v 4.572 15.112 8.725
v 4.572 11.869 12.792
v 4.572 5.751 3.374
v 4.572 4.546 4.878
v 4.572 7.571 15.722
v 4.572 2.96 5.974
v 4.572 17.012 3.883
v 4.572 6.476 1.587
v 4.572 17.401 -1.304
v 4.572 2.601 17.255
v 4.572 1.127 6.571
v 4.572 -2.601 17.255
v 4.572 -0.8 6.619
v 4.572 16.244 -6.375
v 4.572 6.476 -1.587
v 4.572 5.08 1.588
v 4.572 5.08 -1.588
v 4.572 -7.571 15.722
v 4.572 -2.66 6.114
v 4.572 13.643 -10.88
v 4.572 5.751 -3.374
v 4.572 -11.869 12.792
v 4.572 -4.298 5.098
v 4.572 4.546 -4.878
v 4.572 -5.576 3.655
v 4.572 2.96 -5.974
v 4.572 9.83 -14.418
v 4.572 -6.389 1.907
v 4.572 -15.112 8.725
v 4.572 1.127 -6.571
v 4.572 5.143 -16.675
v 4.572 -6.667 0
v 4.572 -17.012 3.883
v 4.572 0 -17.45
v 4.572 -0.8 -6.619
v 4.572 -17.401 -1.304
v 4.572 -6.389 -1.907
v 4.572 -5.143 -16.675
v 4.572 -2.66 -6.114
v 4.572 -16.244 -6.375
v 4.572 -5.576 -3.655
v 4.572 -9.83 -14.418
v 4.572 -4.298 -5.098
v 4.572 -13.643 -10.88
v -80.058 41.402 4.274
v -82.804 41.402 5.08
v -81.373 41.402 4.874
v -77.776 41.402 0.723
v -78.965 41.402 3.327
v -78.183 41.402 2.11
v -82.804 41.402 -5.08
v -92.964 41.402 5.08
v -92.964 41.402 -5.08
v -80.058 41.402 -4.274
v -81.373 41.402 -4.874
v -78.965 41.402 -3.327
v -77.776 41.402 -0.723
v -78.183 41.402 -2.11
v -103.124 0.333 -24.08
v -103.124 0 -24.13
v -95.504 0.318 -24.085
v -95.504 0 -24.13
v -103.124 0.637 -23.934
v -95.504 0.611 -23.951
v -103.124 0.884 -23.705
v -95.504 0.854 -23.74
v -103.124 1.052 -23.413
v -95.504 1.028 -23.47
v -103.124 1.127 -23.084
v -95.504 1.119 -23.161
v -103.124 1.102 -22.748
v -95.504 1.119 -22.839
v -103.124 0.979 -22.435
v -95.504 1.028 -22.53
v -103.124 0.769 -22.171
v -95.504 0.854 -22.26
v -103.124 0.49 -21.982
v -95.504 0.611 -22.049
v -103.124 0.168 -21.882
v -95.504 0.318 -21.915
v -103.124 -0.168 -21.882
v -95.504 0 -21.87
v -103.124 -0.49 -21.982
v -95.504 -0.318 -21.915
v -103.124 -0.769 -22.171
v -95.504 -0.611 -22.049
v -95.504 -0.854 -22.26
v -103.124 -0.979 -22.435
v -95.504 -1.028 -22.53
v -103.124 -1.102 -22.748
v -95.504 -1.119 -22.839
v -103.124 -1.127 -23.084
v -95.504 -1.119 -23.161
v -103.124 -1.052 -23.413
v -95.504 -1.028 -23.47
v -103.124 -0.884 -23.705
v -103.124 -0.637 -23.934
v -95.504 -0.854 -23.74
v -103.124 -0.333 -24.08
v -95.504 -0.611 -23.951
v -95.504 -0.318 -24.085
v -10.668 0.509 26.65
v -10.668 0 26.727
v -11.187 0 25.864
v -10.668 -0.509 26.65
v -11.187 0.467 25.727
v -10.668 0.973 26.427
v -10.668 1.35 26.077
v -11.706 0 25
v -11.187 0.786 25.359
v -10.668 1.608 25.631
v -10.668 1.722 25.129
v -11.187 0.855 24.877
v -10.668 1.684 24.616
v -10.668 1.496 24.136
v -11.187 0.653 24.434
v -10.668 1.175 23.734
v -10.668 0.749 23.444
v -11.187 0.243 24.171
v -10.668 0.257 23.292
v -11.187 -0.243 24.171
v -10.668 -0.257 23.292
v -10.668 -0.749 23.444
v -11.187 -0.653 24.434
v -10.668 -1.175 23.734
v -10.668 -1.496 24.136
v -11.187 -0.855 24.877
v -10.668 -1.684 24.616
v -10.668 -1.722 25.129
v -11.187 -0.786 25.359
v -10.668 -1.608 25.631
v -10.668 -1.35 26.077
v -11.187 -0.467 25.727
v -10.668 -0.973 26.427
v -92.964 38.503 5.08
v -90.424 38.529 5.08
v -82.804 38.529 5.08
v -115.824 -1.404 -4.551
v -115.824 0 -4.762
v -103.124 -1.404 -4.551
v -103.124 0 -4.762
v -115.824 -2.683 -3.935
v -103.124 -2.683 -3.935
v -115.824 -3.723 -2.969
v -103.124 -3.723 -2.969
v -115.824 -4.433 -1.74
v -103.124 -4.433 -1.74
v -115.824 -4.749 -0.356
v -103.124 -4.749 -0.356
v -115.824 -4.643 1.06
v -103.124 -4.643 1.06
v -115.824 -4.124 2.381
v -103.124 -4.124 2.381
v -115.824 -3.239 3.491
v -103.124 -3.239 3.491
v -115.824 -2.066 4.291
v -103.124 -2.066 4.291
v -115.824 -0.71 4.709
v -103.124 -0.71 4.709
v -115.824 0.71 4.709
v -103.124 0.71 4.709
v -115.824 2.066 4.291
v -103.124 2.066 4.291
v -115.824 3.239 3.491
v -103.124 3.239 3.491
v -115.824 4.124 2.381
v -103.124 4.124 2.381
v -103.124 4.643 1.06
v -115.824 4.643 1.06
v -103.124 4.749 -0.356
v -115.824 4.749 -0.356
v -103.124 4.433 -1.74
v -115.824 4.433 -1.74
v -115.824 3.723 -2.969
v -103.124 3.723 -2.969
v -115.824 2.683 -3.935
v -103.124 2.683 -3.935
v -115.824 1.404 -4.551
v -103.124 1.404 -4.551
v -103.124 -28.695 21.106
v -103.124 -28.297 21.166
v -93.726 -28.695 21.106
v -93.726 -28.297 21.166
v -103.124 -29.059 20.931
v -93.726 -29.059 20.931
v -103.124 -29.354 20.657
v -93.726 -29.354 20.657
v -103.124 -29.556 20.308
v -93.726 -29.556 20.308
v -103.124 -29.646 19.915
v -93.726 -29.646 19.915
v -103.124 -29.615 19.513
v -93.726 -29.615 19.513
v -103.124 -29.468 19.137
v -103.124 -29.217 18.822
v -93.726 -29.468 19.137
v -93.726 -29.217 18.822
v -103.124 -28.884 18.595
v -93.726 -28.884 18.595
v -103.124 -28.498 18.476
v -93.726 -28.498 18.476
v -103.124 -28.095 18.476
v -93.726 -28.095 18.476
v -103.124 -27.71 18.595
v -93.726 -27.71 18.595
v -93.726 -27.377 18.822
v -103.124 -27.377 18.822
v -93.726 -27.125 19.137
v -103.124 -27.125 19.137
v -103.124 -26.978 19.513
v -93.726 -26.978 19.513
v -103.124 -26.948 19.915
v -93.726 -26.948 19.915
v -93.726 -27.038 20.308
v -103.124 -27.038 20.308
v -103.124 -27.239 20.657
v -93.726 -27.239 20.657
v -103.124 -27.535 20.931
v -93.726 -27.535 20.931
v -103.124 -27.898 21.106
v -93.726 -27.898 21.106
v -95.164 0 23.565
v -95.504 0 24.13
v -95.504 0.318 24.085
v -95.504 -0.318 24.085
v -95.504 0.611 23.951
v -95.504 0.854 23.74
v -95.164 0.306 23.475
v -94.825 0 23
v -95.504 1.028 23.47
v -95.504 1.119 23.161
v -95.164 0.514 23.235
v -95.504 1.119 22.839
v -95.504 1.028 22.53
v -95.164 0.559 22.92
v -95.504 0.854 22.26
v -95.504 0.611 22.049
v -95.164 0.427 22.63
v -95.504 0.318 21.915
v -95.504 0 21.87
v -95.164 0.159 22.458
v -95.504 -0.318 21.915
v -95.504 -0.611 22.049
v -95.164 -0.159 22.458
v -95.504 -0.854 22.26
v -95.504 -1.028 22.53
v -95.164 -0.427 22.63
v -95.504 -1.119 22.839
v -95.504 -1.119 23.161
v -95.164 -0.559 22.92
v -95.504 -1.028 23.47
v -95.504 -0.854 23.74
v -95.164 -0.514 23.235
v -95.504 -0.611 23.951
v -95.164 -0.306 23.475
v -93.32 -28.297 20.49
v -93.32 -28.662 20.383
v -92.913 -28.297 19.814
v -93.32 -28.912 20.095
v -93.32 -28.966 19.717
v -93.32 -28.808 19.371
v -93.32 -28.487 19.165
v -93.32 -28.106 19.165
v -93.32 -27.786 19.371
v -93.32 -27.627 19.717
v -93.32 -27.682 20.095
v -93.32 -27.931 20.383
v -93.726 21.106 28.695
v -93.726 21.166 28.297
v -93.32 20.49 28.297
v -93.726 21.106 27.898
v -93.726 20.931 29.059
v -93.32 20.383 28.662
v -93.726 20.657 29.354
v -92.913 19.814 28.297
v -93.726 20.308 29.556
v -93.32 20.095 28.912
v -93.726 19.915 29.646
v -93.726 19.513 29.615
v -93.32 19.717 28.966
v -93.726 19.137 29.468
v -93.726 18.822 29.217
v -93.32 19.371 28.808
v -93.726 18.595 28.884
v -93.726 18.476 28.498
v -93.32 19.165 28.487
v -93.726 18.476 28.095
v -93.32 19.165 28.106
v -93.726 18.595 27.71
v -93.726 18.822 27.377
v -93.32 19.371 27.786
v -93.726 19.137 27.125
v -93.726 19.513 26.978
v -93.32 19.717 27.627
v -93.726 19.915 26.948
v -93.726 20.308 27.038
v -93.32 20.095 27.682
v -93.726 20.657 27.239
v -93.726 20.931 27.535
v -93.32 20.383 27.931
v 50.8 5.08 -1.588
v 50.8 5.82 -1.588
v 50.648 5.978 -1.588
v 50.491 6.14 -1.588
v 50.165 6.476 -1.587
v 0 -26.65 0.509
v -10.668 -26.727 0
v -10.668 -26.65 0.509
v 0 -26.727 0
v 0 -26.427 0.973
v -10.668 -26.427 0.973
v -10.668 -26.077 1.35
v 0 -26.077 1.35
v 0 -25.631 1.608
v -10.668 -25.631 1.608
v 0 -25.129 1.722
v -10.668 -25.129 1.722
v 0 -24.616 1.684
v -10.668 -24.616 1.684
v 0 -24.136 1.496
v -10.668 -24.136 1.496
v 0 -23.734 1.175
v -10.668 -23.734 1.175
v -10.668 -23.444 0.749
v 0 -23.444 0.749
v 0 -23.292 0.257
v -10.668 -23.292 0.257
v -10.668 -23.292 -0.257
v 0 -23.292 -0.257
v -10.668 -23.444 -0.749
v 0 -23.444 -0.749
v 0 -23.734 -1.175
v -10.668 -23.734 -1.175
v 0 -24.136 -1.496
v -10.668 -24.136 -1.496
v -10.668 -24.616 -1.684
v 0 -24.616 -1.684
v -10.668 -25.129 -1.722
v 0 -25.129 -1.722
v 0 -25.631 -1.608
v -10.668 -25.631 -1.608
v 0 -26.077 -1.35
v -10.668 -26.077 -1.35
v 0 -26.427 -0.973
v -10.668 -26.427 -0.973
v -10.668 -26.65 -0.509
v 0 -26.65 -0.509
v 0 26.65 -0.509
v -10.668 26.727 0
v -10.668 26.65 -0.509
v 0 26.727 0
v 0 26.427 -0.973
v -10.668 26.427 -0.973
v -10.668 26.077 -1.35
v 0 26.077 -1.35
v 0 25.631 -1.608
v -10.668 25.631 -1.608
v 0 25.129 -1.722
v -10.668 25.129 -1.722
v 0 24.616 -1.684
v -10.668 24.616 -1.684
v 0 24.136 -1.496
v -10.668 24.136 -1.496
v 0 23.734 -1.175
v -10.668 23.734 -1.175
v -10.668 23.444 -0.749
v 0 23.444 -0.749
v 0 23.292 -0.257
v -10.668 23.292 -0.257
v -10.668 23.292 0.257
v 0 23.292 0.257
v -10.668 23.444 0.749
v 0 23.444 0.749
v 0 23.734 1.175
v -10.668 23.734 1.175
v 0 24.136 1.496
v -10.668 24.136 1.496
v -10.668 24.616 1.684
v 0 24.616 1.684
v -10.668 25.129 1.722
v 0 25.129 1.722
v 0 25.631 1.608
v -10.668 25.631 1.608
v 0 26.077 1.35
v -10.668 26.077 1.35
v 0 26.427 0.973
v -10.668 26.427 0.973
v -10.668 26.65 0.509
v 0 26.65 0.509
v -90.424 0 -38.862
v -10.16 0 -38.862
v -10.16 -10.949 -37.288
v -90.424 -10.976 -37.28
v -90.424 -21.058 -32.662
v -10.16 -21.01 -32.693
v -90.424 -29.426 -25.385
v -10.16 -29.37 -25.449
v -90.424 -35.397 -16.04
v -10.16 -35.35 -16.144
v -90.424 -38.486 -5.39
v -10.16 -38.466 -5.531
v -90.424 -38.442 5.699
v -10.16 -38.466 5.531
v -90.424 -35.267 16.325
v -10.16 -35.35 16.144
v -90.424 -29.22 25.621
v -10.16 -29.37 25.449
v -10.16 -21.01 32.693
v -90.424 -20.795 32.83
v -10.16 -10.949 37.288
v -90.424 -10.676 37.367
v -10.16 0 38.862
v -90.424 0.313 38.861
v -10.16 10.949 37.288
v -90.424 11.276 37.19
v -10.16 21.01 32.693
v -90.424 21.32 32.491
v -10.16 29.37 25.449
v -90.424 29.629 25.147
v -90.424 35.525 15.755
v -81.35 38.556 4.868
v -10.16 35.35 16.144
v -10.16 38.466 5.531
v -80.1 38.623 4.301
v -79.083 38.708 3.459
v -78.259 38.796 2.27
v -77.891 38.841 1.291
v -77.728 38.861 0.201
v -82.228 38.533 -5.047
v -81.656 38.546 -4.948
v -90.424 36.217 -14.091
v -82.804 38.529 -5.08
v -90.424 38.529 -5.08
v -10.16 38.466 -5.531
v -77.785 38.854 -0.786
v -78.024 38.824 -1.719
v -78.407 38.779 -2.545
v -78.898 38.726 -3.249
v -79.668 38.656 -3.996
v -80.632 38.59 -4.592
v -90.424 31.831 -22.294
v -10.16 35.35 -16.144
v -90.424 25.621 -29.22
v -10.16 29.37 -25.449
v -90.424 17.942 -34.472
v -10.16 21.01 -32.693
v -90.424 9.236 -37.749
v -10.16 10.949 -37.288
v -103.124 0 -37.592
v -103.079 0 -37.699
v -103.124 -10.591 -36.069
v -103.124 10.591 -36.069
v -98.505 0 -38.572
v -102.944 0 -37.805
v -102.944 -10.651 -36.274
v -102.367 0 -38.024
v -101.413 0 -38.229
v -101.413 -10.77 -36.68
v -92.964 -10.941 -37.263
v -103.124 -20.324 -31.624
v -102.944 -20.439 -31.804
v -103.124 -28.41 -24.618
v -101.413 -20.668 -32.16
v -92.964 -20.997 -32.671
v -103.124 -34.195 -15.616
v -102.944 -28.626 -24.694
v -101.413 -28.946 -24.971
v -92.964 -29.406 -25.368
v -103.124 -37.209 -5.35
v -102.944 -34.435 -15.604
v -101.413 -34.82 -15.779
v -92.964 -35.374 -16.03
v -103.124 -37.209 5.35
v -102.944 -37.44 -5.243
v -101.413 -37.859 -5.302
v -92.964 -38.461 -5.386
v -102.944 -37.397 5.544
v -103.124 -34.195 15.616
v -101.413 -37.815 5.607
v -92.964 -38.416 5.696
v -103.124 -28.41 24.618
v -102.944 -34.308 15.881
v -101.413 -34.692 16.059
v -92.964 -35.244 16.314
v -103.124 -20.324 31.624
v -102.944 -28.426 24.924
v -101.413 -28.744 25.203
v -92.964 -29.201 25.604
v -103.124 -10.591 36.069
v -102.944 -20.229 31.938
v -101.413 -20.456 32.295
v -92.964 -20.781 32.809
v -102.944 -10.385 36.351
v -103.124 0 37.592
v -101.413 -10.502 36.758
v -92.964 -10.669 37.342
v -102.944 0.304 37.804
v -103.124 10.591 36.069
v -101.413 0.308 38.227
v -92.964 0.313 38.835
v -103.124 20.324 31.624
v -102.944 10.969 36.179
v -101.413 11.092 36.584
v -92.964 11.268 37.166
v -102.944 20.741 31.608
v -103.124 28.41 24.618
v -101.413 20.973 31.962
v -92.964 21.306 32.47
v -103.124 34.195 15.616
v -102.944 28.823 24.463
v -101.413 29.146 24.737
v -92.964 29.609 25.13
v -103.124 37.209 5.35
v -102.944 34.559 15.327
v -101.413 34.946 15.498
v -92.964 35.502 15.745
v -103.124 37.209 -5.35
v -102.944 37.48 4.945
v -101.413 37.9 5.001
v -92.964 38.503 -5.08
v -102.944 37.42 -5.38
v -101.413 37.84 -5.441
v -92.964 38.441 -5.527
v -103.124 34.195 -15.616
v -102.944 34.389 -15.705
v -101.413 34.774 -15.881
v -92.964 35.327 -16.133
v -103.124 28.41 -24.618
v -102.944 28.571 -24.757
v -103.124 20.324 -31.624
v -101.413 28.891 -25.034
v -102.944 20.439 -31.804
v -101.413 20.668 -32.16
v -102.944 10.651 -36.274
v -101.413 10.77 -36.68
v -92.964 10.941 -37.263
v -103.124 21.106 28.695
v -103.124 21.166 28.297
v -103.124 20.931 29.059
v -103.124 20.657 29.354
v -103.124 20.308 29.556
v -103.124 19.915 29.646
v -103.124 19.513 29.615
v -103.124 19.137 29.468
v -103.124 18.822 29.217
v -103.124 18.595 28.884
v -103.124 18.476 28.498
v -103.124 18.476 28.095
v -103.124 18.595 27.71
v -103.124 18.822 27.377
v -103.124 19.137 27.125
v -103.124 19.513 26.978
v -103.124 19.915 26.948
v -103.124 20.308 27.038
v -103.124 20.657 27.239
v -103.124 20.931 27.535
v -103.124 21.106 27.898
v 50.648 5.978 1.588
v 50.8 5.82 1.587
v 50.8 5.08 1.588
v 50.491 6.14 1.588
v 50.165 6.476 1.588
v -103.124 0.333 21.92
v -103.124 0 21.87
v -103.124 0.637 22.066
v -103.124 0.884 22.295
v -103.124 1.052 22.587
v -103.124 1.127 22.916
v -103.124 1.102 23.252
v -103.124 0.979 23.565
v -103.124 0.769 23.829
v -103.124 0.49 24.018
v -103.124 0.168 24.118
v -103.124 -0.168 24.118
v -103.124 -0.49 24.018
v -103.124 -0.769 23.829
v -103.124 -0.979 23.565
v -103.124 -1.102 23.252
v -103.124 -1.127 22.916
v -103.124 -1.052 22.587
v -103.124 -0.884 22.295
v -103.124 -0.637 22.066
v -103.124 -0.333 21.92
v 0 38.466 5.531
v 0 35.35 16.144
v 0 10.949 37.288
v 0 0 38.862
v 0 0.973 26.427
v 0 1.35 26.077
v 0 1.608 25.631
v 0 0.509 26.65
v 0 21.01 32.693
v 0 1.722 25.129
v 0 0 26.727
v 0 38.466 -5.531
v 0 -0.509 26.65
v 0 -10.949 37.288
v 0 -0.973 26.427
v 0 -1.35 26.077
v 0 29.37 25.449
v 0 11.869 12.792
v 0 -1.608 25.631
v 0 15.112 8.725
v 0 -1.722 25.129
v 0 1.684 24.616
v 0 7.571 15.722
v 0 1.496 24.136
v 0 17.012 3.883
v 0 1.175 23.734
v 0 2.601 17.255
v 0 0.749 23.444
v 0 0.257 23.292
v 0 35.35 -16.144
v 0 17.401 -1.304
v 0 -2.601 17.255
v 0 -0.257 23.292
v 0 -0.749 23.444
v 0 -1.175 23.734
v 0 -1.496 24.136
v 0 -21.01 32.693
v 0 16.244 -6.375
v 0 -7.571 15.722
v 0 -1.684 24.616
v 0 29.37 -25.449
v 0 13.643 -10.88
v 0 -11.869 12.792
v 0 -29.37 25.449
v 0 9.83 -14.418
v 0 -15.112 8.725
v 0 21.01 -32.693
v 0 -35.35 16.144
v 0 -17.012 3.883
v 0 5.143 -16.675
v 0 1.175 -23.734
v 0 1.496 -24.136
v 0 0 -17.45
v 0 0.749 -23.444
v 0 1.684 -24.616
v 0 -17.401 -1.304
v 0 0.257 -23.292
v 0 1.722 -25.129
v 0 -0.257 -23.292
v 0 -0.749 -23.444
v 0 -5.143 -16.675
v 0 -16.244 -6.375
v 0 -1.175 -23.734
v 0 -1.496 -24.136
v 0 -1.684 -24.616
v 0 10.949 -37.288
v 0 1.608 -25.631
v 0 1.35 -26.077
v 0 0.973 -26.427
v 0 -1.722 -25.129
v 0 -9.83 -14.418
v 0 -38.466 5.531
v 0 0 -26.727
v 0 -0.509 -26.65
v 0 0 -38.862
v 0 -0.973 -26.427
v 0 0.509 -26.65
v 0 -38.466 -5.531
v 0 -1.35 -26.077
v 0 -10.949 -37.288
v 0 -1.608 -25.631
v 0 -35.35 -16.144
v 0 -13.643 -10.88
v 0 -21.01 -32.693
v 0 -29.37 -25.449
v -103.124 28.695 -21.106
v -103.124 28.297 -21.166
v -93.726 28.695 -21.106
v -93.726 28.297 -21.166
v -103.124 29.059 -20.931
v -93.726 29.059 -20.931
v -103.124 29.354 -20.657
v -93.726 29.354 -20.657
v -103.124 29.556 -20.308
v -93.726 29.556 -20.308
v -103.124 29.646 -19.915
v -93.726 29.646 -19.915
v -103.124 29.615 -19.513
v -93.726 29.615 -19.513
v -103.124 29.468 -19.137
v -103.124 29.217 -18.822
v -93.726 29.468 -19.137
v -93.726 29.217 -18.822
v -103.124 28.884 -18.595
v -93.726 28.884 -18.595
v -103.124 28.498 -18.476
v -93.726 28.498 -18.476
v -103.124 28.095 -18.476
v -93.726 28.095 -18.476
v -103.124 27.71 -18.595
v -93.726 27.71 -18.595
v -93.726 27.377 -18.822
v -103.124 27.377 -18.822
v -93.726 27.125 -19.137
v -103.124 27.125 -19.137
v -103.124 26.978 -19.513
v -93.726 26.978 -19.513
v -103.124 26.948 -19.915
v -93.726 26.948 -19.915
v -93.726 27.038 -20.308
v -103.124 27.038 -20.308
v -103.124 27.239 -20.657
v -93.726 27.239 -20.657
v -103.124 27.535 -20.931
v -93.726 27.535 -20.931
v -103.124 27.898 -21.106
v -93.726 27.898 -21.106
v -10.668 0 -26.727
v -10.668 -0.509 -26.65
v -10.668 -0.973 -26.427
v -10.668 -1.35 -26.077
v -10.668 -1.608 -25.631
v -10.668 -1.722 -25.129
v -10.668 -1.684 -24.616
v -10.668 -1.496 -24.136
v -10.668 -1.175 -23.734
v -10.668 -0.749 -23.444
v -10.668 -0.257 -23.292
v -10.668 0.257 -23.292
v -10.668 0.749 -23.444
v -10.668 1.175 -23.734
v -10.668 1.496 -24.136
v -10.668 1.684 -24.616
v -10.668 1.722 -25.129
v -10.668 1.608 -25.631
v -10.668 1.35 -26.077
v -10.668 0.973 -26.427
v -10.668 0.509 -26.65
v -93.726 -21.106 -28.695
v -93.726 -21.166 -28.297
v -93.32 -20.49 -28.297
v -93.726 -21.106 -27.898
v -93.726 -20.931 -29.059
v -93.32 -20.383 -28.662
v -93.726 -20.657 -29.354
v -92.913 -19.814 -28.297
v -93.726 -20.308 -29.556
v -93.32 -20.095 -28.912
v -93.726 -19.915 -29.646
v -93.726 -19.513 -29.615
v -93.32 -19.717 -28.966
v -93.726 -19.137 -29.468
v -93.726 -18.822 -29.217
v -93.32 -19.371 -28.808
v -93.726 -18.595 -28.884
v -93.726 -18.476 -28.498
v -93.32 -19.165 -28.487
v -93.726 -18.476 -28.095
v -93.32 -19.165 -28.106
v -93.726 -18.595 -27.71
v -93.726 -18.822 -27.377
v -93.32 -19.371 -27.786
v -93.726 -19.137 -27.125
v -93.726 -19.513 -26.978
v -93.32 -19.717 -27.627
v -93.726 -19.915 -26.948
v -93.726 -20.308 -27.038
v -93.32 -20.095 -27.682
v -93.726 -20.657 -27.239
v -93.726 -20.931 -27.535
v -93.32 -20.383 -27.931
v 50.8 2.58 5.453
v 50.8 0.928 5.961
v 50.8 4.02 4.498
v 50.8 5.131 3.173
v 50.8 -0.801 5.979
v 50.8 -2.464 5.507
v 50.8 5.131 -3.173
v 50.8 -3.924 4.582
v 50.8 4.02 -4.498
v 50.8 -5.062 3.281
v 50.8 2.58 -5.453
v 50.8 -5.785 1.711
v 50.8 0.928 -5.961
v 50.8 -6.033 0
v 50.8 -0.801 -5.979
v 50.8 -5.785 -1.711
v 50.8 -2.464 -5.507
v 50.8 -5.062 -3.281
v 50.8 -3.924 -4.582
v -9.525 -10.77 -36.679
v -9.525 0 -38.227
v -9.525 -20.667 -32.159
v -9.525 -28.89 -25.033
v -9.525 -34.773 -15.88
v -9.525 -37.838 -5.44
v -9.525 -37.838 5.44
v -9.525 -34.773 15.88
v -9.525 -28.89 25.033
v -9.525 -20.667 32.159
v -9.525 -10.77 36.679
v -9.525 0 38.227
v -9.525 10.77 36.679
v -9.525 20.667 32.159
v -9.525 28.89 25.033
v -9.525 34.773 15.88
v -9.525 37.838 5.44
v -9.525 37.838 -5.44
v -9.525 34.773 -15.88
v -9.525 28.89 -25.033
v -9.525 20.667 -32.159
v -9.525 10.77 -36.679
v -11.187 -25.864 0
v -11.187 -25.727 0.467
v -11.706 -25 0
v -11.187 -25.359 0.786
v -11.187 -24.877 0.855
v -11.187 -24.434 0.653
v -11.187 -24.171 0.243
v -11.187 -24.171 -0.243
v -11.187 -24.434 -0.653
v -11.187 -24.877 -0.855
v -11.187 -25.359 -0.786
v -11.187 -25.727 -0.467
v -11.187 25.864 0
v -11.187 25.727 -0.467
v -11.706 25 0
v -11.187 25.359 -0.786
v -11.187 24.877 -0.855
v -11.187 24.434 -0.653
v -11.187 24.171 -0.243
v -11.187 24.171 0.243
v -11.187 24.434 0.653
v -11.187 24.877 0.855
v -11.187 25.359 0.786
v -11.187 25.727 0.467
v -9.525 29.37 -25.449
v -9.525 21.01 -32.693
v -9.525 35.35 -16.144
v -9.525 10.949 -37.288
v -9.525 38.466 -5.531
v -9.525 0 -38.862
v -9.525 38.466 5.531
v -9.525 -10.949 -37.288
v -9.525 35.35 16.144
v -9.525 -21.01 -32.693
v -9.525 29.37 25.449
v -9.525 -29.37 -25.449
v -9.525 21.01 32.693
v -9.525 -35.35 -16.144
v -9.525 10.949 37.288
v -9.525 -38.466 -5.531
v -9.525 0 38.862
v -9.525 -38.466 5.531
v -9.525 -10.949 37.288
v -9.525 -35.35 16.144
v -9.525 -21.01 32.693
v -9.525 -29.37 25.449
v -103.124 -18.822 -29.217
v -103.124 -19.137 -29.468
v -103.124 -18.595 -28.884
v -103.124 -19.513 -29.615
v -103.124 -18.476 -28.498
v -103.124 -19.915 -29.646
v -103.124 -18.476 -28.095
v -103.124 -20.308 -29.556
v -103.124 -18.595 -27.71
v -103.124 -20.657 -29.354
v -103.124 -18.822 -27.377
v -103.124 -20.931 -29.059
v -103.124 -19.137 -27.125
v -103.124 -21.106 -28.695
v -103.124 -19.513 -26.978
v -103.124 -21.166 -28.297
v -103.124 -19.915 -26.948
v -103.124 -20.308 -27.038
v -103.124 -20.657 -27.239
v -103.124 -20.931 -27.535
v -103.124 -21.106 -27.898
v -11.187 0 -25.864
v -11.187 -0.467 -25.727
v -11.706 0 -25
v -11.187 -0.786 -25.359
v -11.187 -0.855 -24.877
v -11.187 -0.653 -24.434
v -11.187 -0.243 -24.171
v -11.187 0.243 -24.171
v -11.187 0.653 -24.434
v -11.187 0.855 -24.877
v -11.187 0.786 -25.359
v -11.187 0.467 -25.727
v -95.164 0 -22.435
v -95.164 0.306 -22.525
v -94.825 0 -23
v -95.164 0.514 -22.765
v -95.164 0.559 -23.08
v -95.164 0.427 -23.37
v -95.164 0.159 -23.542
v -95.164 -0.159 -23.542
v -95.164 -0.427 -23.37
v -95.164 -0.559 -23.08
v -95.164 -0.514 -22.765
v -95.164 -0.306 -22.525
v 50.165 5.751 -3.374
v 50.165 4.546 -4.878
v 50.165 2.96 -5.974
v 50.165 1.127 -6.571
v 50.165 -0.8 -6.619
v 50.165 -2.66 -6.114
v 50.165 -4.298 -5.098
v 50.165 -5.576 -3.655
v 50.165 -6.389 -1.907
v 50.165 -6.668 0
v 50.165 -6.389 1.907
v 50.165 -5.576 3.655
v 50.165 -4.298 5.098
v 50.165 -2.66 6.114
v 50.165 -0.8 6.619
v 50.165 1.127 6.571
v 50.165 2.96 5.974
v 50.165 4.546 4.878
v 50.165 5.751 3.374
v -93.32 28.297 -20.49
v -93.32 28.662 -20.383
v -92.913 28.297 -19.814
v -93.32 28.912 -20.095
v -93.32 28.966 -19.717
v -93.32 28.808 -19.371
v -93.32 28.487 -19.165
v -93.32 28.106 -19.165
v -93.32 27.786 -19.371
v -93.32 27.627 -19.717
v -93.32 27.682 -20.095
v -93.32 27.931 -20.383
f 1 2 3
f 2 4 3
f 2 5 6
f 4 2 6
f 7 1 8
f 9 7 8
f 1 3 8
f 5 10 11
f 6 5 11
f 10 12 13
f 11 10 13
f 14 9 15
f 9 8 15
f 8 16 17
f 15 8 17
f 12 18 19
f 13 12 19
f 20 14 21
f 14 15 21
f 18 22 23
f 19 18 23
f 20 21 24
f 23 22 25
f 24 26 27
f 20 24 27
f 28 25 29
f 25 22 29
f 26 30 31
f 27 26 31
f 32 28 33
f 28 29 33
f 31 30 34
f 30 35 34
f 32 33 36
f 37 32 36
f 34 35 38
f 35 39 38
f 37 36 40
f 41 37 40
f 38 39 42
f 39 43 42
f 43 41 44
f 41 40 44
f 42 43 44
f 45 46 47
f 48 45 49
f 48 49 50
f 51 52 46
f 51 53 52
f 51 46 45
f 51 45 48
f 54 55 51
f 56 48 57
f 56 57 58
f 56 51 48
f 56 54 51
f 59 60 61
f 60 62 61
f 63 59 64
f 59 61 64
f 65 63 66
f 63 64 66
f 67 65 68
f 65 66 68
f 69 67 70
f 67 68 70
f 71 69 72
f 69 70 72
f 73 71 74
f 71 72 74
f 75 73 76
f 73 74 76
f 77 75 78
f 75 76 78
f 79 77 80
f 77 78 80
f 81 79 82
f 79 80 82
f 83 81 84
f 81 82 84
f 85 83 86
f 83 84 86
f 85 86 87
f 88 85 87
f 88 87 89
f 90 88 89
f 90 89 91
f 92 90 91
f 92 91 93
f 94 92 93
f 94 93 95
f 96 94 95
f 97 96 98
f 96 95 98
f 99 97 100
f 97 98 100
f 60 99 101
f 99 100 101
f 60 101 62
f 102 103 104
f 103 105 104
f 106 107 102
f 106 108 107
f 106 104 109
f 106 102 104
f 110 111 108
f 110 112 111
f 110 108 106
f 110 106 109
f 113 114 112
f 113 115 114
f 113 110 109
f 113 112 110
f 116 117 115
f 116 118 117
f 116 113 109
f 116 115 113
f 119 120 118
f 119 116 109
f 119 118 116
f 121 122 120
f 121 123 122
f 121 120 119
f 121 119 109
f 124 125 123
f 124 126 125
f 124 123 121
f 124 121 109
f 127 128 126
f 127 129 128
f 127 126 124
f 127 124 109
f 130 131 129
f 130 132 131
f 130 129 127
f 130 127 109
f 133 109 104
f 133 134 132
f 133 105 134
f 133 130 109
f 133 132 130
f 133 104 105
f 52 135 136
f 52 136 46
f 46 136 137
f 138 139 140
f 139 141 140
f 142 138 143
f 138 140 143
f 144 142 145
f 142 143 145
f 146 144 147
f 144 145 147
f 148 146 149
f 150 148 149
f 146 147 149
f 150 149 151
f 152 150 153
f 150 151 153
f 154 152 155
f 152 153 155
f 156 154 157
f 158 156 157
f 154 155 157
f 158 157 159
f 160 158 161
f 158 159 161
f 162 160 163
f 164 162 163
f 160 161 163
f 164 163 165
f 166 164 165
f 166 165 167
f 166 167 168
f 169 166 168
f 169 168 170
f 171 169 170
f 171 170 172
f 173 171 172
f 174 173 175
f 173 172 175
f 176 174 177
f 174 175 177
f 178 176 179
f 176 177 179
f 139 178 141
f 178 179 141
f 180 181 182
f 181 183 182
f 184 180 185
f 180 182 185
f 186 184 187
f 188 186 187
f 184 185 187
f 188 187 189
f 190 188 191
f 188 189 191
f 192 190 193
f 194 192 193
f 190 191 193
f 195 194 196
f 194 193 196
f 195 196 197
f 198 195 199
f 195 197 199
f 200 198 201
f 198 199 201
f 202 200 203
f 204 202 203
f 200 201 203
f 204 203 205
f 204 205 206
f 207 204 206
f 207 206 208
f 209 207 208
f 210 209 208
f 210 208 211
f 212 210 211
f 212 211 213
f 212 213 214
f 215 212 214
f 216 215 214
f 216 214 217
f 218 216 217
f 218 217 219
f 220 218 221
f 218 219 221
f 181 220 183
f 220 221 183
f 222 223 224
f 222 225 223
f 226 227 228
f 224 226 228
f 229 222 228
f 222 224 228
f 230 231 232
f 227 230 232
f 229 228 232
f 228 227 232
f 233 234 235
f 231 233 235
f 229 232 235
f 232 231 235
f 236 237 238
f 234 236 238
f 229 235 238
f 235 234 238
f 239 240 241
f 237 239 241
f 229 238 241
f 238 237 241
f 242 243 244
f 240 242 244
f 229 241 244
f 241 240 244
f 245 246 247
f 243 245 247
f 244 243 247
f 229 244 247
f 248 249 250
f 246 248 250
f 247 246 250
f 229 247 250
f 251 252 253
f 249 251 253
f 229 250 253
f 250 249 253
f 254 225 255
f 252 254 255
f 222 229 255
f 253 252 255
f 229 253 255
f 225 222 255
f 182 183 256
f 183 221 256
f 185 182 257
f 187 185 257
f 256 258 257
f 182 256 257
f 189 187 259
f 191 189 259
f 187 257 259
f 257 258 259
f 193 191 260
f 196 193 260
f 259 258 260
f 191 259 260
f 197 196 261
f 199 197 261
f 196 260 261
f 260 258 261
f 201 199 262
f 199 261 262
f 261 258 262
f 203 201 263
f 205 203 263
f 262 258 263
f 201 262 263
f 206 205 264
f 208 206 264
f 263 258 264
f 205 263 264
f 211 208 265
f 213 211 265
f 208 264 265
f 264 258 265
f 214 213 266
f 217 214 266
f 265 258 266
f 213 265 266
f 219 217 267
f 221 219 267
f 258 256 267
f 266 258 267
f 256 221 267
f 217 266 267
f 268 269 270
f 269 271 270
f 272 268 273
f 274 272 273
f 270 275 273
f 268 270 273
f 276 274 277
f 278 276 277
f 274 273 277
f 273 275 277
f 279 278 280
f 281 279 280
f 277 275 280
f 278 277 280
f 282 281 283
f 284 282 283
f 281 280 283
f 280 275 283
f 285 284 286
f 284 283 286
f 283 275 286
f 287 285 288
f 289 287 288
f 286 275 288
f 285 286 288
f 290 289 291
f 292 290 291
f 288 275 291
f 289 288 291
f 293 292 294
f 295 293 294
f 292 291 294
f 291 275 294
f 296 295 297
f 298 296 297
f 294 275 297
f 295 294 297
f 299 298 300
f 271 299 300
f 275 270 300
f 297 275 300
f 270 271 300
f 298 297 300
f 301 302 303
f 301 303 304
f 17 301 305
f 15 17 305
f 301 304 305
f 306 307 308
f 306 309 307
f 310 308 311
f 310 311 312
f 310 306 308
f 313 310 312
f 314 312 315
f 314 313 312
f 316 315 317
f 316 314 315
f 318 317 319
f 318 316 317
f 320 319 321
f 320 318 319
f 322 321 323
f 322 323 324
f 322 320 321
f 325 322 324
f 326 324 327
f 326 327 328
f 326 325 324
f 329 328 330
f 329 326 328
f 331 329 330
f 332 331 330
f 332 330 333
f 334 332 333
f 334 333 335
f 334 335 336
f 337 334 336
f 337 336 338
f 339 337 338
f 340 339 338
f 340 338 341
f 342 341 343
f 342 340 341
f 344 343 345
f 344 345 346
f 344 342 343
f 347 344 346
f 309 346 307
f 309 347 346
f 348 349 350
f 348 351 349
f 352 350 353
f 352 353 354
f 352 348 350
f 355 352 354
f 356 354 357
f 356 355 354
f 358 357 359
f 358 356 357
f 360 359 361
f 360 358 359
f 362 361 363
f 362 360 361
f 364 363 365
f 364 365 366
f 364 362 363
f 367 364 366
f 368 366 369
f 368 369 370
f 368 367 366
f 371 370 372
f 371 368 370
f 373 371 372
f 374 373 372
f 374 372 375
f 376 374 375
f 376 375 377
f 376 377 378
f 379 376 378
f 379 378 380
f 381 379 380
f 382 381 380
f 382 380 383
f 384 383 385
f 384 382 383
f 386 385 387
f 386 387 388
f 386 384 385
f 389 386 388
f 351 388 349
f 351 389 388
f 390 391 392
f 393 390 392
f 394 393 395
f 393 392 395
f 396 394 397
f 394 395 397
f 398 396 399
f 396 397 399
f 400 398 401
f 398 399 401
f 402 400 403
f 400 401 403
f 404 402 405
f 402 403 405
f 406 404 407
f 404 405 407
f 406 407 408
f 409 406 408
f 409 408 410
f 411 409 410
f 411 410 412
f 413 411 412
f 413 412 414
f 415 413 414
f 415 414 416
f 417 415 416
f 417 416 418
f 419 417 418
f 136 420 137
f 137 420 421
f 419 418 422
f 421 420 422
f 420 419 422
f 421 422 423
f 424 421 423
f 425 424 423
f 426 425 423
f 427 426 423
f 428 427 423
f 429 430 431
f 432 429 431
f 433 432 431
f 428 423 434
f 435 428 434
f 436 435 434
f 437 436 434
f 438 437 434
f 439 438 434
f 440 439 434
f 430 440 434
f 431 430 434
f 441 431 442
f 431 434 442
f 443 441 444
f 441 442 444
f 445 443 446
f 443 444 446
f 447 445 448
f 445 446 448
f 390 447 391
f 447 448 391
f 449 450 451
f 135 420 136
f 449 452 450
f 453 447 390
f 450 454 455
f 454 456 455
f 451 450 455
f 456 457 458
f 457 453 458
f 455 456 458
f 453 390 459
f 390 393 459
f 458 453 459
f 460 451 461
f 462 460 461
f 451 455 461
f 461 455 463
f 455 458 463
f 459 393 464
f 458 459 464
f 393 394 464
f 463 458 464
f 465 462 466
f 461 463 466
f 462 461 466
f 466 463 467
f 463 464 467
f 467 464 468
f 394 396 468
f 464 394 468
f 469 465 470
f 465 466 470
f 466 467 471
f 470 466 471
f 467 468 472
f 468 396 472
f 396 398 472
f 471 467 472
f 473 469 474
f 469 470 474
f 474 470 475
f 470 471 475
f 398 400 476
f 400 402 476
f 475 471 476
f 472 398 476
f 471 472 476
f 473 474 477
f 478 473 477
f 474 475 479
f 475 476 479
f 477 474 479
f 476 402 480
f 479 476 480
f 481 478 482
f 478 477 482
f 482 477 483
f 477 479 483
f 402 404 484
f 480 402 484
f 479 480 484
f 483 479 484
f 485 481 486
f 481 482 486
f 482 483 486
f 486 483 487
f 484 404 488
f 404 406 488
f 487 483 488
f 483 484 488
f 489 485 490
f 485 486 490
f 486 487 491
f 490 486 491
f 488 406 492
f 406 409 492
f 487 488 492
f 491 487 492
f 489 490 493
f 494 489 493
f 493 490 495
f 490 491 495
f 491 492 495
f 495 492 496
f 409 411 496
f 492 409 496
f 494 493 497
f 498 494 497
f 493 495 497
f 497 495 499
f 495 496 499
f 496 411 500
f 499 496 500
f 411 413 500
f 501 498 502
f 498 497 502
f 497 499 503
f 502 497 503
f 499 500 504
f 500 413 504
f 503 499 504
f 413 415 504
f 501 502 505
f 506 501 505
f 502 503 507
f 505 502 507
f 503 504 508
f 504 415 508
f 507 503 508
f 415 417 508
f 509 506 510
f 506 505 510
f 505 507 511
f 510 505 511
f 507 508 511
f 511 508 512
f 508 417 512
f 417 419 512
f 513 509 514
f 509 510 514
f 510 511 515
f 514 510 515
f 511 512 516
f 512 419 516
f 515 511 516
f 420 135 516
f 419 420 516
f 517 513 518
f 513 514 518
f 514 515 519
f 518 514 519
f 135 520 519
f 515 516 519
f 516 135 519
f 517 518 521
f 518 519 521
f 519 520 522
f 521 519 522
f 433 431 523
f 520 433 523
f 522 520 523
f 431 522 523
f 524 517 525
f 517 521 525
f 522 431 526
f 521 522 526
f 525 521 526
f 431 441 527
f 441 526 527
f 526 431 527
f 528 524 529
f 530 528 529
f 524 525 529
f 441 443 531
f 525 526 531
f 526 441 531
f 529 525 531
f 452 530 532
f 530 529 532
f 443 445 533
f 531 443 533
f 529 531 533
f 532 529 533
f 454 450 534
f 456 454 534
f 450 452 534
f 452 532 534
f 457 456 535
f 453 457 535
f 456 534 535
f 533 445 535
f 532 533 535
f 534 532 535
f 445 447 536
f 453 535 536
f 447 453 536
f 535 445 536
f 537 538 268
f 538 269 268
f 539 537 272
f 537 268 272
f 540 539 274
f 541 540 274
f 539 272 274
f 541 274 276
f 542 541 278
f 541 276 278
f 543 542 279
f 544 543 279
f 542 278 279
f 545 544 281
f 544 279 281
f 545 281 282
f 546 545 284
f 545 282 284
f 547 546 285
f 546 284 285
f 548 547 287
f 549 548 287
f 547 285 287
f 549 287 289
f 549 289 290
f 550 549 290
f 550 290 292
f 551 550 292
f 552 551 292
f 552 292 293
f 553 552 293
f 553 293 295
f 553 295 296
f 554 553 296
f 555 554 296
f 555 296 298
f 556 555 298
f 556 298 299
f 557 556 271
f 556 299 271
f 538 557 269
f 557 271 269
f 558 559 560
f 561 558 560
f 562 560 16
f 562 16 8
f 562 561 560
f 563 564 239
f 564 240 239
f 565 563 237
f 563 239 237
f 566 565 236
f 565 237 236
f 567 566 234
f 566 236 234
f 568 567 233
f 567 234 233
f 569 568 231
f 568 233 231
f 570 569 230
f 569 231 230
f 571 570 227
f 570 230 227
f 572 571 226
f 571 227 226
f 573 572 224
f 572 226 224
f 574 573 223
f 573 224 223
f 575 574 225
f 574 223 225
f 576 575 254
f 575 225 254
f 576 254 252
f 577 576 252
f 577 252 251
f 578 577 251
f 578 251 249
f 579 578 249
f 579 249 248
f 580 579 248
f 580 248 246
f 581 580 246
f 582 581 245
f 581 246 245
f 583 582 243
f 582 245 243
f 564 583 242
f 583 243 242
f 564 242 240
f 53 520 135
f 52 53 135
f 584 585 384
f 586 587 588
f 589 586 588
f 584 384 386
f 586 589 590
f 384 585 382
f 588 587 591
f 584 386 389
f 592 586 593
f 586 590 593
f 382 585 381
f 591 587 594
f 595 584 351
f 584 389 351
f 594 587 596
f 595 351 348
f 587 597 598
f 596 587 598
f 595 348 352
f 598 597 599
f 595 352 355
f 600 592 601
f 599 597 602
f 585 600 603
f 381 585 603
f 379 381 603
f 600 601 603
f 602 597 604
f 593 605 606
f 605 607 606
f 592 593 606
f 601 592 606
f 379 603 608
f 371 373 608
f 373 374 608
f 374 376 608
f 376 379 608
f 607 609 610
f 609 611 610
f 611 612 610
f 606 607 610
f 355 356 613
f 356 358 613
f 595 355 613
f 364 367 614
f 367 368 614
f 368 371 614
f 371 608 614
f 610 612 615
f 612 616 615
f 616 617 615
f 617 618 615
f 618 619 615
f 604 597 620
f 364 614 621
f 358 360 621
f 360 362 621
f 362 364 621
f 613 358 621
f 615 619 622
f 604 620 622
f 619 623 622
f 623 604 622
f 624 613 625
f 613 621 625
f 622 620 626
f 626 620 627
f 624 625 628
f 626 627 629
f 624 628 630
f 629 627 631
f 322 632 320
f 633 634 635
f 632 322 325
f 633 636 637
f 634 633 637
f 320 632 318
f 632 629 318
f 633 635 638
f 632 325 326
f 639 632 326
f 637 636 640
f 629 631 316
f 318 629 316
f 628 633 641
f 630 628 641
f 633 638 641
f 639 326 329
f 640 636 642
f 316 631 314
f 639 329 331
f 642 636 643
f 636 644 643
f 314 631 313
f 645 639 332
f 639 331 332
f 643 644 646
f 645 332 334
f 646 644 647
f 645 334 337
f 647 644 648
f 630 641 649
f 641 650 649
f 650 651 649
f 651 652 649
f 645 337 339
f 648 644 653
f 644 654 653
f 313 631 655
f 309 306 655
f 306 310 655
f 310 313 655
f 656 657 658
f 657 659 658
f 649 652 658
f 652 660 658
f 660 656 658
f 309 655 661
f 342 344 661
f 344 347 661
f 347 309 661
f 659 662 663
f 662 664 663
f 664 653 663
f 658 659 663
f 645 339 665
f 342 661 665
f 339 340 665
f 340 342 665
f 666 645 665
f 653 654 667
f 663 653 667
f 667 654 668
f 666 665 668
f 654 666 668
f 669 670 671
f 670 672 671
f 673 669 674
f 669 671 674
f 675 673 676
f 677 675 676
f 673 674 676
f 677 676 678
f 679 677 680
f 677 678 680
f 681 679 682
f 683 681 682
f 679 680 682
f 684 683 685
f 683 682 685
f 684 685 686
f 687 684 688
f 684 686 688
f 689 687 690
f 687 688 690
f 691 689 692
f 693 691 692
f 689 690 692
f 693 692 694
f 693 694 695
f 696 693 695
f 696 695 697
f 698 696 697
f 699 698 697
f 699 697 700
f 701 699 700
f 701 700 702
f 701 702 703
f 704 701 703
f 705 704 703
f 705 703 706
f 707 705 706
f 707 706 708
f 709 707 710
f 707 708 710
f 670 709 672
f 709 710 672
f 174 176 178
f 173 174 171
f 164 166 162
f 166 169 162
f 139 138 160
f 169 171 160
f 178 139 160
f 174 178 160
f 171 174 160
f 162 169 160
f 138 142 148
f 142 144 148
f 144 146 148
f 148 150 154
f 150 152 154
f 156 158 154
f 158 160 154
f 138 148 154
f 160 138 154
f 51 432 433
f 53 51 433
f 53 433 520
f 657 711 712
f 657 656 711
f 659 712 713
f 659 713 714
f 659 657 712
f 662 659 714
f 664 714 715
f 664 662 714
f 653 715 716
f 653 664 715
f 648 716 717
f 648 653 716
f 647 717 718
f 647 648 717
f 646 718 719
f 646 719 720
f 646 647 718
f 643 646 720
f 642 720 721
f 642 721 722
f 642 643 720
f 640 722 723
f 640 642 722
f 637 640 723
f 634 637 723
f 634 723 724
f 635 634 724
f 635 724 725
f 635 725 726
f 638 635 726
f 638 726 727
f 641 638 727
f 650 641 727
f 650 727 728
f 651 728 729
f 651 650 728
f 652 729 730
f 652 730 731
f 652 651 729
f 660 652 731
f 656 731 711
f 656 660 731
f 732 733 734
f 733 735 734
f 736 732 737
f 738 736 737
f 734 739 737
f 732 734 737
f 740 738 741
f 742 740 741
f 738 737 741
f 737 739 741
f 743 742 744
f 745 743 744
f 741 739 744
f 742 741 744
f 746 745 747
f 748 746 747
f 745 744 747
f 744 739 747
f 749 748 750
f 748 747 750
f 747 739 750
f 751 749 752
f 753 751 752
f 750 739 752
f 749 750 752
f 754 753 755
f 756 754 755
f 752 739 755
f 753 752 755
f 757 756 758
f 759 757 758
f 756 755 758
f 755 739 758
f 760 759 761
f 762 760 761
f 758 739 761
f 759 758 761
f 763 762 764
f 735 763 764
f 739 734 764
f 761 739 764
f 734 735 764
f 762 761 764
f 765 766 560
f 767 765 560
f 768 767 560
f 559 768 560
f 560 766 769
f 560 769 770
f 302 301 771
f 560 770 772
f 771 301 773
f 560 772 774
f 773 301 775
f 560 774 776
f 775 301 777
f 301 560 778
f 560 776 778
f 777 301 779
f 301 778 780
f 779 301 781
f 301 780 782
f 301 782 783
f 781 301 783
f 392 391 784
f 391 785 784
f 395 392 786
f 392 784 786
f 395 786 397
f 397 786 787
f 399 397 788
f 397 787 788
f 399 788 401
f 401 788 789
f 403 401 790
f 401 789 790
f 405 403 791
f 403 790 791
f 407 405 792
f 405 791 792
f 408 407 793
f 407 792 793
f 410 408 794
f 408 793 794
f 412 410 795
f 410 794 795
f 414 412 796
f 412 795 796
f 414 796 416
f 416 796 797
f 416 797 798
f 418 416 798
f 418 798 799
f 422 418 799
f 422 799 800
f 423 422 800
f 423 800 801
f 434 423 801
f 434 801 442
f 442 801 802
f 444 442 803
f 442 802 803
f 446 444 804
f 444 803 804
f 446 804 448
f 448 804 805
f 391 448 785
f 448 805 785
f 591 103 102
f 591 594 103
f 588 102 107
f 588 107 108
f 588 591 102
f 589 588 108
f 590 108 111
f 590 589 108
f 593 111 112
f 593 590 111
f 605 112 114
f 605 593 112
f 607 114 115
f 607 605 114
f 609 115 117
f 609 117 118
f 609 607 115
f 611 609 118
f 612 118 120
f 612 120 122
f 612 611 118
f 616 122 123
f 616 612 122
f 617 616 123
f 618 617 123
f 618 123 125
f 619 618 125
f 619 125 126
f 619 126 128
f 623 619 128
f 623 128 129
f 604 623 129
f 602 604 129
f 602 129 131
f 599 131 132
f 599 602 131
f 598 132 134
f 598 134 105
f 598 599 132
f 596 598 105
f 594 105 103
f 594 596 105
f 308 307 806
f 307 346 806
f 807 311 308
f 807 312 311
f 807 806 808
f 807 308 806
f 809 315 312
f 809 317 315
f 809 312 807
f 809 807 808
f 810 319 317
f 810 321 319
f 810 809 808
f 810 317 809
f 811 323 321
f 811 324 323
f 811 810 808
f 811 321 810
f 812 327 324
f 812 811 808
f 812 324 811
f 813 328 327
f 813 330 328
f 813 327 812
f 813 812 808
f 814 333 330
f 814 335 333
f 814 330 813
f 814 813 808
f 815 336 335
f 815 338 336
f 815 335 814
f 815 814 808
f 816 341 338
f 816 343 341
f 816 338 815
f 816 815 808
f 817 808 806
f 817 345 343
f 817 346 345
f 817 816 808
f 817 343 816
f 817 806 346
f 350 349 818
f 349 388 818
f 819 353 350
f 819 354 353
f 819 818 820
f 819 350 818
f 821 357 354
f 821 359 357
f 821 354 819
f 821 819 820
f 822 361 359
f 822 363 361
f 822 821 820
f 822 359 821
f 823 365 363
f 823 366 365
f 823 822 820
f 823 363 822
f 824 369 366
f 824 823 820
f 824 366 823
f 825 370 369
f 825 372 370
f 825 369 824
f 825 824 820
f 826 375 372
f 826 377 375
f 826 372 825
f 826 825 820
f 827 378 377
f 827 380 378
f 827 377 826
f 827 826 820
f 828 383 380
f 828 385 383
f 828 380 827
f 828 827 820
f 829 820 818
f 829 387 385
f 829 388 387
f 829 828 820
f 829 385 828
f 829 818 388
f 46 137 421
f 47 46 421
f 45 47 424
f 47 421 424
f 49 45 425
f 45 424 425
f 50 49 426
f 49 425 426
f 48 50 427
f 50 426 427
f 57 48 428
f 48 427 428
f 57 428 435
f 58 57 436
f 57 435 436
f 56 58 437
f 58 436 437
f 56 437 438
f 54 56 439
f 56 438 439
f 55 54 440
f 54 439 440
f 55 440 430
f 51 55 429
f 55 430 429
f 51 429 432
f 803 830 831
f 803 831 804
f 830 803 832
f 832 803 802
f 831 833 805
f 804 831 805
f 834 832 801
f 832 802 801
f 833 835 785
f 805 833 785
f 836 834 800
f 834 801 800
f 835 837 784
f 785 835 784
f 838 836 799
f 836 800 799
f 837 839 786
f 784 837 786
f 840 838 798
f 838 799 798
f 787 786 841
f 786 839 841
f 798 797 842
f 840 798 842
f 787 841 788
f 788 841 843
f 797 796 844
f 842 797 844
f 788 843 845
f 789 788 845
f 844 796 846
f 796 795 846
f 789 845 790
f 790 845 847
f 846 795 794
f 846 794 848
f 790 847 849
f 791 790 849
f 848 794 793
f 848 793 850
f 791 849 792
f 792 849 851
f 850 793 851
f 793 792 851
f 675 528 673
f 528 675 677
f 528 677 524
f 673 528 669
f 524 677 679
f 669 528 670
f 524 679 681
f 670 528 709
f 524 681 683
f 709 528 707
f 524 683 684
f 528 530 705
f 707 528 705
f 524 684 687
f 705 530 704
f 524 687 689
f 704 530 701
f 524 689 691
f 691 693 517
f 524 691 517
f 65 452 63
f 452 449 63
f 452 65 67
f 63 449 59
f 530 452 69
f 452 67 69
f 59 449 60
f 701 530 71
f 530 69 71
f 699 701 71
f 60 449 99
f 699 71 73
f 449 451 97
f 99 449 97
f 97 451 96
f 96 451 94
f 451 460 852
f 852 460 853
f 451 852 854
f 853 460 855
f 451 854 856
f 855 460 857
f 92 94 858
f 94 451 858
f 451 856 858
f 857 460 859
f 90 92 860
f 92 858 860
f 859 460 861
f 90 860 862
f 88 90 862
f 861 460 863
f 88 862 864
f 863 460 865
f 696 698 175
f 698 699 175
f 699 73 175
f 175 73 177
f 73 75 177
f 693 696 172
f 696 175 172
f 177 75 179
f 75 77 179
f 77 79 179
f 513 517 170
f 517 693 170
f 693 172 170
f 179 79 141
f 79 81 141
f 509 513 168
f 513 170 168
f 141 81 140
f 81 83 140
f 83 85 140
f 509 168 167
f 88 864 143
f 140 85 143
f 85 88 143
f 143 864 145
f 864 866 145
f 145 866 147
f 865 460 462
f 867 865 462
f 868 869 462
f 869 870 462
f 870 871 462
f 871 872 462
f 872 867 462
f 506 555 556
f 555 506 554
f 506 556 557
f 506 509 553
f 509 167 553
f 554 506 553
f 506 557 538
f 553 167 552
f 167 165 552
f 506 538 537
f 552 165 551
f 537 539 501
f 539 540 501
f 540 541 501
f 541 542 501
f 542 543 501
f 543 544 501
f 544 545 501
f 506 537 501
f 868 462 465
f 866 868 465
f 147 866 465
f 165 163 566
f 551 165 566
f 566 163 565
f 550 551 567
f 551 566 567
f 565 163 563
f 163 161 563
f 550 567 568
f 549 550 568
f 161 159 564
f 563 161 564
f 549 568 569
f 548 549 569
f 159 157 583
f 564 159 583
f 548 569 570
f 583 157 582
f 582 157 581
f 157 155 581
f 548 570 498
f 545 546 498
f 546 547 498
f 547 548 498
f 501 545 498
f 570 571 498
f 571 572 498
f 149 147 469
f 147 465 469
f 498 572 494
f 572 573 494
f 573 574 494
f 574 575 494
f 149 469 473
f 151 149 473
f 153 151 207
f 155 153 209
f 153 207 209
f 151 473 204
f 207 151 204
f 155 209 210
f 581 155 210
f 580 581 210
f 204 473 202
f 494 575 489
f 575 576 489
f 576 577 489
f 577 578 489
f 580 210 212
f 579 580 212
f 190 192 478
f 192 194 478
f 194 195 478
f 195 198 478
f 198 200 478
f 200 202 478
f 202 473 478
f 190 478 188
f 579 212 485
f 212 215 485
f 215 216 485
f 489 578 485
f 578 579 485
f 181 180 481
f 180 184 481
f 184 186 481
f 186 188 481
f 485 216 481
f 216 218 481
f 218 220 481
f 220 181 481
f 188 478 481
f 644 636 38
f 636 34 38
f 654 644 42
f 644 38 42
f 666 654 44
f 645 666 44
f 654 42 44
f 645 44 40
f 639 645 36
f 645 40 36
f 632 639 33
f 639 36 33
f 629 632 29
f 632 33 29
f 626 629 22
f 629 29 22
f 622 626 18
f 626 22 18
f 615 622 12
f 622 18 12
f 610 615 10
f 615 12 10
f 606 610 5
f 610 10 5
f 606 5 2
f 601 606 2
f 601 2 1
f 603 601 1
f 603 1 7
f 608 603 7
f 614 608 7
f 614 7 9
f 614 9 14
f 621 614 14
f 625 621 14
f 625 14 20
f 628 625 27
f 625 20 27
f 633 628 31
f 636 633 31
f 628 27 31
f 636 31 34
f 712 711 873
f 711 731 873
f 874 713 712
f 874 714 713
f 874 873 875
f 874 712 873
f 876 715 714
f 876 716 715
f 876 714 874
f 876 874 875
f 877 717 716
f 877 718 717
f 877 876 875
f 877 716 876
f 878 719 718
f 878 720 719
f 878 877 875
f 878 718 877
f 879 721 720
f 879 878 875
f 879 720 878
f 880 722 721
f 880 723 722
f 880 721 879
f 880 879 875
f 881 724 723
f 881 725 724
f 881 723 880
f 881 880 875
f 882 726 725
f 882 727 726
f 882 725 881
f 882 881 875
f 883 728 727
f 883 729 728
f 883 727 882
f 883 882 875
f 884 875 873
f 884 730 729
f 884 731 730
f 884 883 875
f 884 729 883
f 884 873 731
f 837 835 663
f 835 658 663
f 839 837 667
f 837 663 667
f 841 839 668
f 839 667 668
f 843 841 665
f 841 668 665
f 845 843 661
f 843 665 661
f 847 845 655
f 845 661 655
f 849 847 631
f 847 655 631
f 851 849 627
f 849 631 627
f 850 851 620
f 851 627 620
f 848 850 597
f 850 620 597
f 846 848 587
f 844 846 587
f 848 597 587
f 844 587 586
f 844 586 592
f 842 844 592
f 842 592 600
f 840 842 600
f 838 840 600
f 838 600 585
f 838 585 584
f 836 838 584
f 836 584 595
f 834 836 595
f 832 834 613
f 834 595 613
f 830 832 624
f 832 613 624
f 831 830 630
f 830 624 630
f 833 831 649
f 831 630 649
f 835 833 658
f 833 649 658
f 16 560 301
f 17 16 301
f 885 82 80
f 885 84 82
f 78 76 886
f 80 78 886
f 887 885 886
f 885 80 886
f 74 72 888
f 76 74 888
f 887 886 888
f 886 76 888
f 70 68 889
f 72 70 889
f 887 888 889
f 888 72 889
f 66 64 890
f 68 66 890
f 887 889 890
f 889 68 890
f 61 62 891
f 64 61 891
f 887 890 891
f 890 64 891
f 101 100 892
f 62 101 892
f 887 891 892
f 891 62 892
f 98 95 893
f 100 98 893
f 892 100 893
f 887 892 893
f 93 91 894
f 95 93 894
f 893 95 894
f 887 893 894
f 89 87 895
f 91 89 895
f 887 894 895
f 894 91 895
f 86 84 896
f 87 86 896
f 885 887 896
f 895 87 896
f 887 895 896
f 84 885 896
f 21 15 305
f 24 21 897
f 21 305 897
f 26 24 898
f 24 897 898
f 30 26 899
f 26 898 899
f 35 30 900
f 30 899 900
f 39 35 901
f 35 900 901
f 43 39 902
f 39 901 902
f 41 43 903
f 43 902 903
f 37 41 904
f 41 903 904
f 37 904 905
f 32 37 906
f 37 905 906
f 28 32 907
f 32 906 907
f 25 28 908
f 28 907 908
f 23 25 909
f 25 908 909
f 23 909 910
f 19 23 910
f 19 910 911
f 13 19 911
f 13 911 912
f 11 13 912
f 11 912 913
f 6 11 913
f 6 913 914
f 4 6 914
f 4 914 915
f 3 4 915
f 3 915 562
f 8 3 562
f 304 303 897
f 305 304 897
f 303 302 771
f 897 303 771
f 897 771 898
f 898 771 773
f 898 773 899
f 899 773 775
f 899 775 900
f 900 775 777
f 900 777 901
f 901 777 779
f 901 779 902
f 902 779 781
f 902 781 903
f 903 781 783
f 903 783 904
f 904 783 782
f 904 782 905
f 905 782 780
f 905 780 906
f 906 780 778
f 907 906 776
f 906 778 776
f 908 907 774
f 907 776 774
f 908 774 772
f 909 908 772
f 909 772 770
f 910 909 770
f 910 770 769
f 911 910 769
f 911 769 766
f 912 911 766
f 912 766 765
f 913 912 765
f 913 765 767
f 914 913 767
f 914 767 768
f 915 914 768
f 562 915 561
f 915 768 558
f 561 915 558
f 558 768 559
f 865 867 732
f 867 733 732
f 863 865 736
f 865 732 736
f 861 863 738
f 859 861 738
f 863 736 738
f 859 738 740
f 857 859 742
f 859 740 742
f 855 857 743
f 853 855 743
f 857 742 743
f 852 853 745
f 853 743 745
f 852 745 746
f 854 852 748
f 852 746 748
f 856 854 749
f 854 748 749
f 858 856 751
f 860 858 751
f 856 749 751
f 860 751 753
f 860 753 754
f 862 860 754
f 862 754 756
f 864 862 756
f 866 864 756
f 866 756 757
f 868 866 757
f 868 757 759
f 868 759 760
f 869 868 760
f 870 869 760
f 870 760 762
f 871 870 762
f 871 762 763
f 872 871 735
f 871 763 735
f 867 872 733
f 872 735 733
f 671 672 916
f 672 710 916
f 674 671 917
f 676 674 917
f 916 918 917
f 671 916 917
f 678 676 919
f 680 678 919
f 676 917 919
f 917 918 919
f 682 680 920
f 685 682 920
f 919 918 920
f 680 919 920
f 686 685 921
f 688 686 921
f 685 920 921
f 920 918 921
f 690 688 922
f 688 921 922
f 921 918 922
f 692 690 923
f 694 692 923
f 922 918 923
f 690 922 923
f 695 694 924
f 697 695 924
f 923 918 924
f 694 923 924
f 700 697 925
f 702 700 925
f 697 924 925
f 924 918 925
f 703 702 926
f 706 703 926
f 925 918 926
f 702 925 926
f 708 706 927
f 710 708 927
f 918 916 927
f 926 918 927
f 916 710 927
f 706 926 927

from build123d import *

# Parameters (mm, degrees)
FILLET1_SIZE              = 1.27
FILLET1_SIZE_2            = 12.7
SKETCH3_W                 = 3.175
SKETCH3_H                 = 3.175
CUT_EXTRUDE1_DEPTH        = 46.228
F_4_40_TAPPED_HOLE1_D     = 2.2606
F_4_40_TAPPED_HOLE1_DEPTH = 7.62
F_4_40_TAPPED_HOLE1_TIP   = 0.679152758
CIRPATTERN1_COUNT         = 4
BOSS_EXTRUDE1_DEPTH       = 41.402


# Read off the part's stored shape, not the designer's step: #6-32 Tapped Hole1
with BuildPart() as part:
    # Sketch2 → Revolve1 (revolve)
    with BuildSketch(Plane.XY, mode=Mode.PRIVATE) as revolve1_sk:
        Polygon((50.8, 0), (-115.824, 0), (-115.824, 4.7625), (-103.124, 4.7625), (-103.124, 38.862), (-10.16, 38.862), (-9.525, 38.227), (-9.525, 38.862), (0, 38.862), (0, 17.4498), (4.572, 17.4498), (4.572, 6.6675), (50.165, 6.6675), (50.8, 6.0325), align=None)
    revolve(revolve1_sk.sketch.rotate(Axis((88.99, 0, 0), (-1, 0, 0)), 90), axis=Axis((88.99, 0, 0), (-1, 0, 0)))

    # Fillet1
    # an asymmetric fillet: 12.7, 1.27 mm, written as the material it takes off along each edge
    with BuildSketch(Plane(origin=(-103.124, 0, 0), x_dir=(0, 0, -1), z_dir=(0, 1, 0))) as fillet1_piece_1:
        with BuildLine():
            Bezier((38.862 - FILLET1_SIZE, 0), (38.862, 0), (38.862, -FILLET1_SIZE_2), weights=[1, 0.707106781, 1])
            Line((38.862, -FILLET1_SIZE_2), (38.862, 0))
            Line((38.862, 0), (38.862 - FILLET1_SIZE, 0))
        make_face()
    revolve(axis=Axis((-103.124, 0, 0), (-1, 0, 0)), mode=Mode.SUBTRACT)

    # Sketch3 → Cut-Extrude1 (cut)
    with BuildSketch(Plane(origin=(50.8, 0, 0), x_dir=(0, 0, -1), z_dir=(1, 0, 0))):
        with Locations((0, 6.6675)):
            Rectangle(SKETCH3_W, SKETCH3_H)
    extrude(amount=-CUT_EXTRUDE1_DEPTH, mode=Mode.SUBTRACT)

    # Sketch8 → #8-32 Tapped Hole3 (revolve, cut)
    with BuildSketch(Plane(origin=(0, 0, -25), x_dir=(0, 0, -1), z_dir=(0, 1, 0))):
        Polygon((0, 0), (0, 11.705806461), (1.7272, 10.668), (1.7272, 0), align=None)
    f_8_32_tapped_hole3 = revolve(axis=Axis((6.35, 0, -25), (-1, 0, 0)), mode=Mode.SUBTRACT)

    # #6-32 Tapped Hole1 outline → #6-32 Tapped Hole1 (revolve, cut)
    with BuildSketch(Plane(origin=(0, 19.813624417, 28.296788218), x_dir=(0, 1, 0), z_dir=(0, 0, -1))):
        Polygon((1.35255, -93.726), (0, -92.91330597), (0, -103.124), (1.35255, -103.124), align=None)
    f_6_32_tapped_hole1 = revolve(axis=Axis((0, 19.813624417, 28.296788218), (1, 0, 0)), mode=Mode.SUBTRACT)

    # #4-40 Tapped Hole1
    with Locations(Plane.ZY.offset(103.124)):
        with Locations((-23, 0), (23, 0)):
            Hole(F_4_40_TAPPED_HOLE1_D / 2, depth=F_4_40_TAPPED_HOLE1_DEPTH)
            with Locations((0, 0, -(F_4_40_TAPPED_HOLE1_DEPTH + F_4_40_TAPPED_HOLE1_TIP / 2))):  # 118° drill point
                Cone(0, F_4_40_TAPPED_HOLE1_D / 2, F_4_40_TAPPED_HOLE1_TIP, mode=Mode.SUBTRACT)

    # CirPattern1: #8-32 Tapped Hole3, #6-32 Tapped Hole1 ×4 about axis
    cirpattern1_axis = Axis((0, 0, 0), (1, 0, 0))
    add([f_8_32_tapped_hole3.rotate(cirpattern1_axis, i * 360 / CIRPATTERN1_COUNT) for i in range(1, CIRPATTERN1_COUNT)], mode=Mode.SUBTRACT)
    add([f_6_32_tapped_hole1.rotate(cirpattern1_axis, i * 360 / CIRPATTERN1_COUNT) for i in range(1, CIRPATTERN1_COUNT)], mode=Mode.SUBTRACT)

    # Sketch12 → Boss-Extrude1 (add)
    with BuildSketch(Plane(origin=(0, 0, 0), x_dir=(1, 0, 0), z_dir=(0, 1, 0))):
        with BuildLine():
            Line((-92.964, -5.08), (-82.804, -5.08))
            ThreePointArc((-82.804, -5.08), (-77.724, 0), (-82.804, 5.08))
            Line((-82.804, 5.08), (-92.964, 5.08))
            Line((-92.964, 5.08), (-92.964, -5.08))
        make_face()
    extrude(amount=BOSS_EXTRUDE1_DEPTH)


solid = part.part
